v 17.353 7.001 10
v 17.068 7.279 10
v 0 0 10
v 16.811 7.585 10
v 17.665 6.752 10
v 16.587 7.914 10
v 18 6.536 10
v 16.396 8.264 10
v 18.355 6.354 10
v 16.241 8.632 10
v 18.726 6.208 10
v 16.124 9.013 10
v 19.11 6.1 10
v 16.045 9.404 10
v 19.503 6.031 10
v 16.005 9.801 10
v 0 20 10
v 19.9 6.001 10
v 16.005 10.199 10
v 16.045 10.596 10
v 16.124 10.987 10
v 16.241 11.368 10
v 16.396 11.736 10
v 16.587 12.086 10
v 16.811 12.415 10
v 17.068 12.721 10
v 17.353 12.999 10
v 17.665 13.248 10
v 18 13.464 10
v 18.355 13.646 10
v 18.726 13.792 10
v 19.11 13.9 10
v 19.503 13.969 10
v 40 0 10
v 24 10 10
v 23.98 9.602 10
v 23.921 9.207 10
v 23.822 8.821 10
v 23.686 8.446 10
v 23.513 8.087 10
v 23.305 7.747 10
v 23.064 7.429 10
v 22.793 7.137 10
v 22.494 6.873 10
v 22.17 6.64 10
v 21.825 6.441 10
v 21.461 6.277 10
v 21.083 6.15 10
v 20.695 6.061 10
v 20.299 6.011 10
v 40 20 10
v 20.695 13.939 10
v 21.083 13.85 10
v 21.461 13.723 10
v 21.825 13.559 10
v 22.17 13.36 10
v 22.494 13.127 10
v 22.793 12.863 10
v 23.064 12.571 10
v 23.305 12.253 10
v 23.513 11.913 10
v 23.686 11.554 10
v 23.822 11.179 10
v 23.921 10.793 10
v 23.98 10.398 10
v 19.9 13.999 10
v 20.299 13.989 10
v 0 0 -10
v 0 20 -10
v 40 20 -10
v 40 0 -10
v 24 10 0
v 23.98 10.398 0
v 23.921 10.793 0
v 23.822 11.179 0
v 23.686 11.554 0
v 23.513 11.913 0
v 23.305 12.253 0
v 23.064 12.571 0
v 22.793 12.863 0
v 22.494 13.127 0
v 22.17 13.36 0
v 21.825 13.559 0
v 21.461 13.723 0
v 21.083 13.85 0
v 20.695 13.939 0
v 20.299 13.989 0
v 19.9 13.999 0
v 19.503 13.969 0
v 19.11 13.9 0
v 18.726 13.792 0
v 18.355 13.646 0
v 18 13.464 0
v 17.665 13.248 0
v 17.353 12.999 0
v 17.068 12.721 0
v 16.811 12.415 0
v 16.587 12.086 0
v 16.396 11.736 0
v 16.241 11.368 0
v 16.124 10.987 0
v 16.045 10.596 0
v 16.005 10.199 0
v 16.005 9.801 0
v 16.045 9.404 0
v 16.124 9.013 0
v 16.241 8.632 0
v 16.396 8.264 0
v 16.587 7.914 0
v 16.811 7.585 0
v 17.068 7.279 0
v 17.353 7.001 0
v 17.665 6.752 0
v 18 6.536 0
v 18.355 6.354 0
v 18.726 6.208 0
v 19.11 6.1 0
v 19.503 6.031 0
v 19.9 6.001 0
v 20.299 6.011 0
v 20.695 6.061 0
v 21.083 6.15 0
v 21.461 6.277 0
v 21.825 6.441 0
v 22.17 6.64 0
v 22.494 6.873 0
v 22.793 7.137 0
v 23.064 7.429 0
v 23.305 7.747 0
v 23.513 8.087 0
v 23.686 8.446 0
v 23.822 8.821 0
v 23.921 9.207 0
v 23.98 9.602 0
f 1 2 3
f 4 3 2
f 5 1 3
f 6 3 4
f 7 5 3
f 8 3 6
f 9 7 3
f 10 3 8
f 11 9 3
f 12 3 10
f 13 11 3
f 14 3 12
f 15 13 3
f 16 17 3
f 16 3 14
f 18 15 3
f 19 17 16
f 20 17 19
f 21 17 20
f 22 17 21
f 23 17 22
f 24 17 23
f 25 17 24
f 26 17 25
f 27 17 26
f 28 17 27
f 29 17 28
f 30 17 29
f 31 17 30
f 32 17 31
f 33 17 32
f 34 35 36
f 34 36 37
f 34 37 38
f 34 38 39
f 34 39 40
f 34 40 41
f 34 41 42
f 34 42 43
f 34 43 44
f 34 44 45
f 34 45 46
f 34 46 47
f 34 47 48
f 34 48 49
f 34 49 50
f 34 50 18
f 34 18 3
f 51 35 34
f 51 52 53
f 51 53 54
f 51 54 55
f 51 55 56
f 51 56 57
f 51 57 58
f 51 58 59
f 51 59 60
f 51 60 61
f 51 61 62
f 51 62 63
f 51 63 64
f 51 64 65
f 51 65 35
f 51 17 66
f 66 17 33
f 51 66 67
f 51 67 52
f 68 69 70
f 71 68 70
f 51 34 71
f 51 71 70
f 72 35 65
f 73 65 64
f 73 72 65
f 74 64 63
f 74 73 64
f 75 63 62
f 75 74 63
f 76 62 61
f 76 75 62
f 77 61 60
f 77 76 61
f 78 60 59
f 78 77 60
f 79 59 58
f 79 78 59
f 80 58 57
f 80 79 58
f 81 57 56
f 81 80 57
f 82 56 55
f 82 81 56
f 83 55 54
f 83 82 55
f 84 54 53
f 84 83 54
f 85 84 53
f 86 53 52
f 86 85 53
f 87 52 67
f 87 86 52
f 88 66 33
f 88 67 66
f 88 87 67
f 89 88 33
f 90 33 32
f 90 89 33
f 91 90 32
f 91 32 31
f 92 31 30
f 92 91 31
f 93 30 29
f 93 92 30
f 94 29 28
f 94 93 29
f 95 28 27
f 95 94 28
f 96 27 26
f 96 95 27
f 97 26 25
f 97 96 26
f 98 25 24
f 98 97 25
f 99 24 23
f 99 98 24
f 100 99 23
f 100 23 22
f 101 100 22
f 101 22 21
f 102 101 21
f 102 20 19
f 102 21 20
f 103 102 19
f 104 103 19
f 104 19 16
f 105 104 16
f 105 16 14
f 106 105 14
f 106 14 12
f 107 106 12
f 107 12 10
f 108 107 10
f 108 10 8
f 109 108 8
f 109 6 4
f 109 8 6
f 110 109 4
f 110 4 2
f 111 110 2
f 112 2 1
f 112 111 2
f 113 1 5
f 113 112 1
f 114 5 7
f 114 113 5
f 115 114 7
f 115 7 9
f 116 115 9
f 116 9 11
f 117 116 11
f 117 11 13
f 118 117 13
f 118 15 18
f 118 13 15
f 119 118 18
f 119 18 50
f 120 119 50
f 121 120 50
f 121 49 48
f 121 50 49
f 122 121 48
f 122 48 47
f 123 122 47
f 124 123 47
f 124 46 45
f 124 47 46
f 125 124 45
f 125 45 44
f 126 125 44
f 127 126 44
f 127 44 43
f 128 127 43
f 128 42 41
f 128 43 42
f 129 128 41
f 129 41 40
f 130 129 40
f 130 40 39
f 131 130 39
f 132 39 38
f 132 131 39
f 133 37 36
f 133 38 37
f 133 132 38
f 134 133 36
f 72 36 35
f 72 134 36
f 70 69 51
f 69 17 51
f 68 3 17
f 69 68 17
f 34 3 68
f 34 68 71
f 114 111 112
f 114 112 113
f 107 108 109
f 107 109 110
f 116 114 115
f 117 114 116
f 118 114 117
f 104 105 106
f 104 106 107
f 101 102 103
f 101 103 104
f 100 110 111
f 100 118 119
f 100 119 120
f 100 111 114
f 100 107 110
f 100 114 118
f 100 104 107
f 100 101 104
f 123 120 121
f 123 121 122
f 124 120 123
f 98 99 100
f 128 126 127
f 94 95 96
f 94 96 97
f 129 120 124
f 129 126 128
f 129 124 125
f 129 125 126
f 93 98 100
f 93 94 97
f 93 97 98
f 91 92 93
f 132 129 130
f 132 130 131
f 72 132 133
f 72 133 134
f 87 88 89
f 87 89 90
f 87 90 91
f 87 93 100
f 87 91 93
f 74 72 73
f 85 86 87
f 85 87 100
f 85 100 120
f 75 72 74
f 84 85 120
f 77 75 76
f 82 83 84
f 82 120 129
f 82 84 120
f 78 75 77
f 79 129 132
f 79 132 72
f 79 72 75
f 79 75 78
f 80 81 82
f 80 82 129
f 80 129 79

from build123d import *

# Parameters (mm, degrees)
SKETCH1_W           = 40
SKETCH1_H           = 20
BOSS_EXTRUDE1_DEPTH = 10
SKETCH2_R           = 4
CUT_EXTRUDE1_DEPTH  = 46.82575695


with BuildPart() as part:
    # Sketch1 → Boss-Extrude1 (new, symmetric)
    with BuildSketch(Plane.XY):
        with Locations((20, 10)):
            Rectangle(SKETCH1_W, SKETCH1_H)
    extrude(amount=BOSS_EXTRUDE1_DEPTH, both=True)

    # Sketch2 → Cut-Extrude1 (cut, through all)
    with BuildSketch(Plane.XY):
        with Locations((20, 10)):
            Circle(SKETCH2_R)
    extrude(amount=CUT_EXTRUDE1_DEPTH, mode=Mode.SUBTRACT)


solid = part.part
